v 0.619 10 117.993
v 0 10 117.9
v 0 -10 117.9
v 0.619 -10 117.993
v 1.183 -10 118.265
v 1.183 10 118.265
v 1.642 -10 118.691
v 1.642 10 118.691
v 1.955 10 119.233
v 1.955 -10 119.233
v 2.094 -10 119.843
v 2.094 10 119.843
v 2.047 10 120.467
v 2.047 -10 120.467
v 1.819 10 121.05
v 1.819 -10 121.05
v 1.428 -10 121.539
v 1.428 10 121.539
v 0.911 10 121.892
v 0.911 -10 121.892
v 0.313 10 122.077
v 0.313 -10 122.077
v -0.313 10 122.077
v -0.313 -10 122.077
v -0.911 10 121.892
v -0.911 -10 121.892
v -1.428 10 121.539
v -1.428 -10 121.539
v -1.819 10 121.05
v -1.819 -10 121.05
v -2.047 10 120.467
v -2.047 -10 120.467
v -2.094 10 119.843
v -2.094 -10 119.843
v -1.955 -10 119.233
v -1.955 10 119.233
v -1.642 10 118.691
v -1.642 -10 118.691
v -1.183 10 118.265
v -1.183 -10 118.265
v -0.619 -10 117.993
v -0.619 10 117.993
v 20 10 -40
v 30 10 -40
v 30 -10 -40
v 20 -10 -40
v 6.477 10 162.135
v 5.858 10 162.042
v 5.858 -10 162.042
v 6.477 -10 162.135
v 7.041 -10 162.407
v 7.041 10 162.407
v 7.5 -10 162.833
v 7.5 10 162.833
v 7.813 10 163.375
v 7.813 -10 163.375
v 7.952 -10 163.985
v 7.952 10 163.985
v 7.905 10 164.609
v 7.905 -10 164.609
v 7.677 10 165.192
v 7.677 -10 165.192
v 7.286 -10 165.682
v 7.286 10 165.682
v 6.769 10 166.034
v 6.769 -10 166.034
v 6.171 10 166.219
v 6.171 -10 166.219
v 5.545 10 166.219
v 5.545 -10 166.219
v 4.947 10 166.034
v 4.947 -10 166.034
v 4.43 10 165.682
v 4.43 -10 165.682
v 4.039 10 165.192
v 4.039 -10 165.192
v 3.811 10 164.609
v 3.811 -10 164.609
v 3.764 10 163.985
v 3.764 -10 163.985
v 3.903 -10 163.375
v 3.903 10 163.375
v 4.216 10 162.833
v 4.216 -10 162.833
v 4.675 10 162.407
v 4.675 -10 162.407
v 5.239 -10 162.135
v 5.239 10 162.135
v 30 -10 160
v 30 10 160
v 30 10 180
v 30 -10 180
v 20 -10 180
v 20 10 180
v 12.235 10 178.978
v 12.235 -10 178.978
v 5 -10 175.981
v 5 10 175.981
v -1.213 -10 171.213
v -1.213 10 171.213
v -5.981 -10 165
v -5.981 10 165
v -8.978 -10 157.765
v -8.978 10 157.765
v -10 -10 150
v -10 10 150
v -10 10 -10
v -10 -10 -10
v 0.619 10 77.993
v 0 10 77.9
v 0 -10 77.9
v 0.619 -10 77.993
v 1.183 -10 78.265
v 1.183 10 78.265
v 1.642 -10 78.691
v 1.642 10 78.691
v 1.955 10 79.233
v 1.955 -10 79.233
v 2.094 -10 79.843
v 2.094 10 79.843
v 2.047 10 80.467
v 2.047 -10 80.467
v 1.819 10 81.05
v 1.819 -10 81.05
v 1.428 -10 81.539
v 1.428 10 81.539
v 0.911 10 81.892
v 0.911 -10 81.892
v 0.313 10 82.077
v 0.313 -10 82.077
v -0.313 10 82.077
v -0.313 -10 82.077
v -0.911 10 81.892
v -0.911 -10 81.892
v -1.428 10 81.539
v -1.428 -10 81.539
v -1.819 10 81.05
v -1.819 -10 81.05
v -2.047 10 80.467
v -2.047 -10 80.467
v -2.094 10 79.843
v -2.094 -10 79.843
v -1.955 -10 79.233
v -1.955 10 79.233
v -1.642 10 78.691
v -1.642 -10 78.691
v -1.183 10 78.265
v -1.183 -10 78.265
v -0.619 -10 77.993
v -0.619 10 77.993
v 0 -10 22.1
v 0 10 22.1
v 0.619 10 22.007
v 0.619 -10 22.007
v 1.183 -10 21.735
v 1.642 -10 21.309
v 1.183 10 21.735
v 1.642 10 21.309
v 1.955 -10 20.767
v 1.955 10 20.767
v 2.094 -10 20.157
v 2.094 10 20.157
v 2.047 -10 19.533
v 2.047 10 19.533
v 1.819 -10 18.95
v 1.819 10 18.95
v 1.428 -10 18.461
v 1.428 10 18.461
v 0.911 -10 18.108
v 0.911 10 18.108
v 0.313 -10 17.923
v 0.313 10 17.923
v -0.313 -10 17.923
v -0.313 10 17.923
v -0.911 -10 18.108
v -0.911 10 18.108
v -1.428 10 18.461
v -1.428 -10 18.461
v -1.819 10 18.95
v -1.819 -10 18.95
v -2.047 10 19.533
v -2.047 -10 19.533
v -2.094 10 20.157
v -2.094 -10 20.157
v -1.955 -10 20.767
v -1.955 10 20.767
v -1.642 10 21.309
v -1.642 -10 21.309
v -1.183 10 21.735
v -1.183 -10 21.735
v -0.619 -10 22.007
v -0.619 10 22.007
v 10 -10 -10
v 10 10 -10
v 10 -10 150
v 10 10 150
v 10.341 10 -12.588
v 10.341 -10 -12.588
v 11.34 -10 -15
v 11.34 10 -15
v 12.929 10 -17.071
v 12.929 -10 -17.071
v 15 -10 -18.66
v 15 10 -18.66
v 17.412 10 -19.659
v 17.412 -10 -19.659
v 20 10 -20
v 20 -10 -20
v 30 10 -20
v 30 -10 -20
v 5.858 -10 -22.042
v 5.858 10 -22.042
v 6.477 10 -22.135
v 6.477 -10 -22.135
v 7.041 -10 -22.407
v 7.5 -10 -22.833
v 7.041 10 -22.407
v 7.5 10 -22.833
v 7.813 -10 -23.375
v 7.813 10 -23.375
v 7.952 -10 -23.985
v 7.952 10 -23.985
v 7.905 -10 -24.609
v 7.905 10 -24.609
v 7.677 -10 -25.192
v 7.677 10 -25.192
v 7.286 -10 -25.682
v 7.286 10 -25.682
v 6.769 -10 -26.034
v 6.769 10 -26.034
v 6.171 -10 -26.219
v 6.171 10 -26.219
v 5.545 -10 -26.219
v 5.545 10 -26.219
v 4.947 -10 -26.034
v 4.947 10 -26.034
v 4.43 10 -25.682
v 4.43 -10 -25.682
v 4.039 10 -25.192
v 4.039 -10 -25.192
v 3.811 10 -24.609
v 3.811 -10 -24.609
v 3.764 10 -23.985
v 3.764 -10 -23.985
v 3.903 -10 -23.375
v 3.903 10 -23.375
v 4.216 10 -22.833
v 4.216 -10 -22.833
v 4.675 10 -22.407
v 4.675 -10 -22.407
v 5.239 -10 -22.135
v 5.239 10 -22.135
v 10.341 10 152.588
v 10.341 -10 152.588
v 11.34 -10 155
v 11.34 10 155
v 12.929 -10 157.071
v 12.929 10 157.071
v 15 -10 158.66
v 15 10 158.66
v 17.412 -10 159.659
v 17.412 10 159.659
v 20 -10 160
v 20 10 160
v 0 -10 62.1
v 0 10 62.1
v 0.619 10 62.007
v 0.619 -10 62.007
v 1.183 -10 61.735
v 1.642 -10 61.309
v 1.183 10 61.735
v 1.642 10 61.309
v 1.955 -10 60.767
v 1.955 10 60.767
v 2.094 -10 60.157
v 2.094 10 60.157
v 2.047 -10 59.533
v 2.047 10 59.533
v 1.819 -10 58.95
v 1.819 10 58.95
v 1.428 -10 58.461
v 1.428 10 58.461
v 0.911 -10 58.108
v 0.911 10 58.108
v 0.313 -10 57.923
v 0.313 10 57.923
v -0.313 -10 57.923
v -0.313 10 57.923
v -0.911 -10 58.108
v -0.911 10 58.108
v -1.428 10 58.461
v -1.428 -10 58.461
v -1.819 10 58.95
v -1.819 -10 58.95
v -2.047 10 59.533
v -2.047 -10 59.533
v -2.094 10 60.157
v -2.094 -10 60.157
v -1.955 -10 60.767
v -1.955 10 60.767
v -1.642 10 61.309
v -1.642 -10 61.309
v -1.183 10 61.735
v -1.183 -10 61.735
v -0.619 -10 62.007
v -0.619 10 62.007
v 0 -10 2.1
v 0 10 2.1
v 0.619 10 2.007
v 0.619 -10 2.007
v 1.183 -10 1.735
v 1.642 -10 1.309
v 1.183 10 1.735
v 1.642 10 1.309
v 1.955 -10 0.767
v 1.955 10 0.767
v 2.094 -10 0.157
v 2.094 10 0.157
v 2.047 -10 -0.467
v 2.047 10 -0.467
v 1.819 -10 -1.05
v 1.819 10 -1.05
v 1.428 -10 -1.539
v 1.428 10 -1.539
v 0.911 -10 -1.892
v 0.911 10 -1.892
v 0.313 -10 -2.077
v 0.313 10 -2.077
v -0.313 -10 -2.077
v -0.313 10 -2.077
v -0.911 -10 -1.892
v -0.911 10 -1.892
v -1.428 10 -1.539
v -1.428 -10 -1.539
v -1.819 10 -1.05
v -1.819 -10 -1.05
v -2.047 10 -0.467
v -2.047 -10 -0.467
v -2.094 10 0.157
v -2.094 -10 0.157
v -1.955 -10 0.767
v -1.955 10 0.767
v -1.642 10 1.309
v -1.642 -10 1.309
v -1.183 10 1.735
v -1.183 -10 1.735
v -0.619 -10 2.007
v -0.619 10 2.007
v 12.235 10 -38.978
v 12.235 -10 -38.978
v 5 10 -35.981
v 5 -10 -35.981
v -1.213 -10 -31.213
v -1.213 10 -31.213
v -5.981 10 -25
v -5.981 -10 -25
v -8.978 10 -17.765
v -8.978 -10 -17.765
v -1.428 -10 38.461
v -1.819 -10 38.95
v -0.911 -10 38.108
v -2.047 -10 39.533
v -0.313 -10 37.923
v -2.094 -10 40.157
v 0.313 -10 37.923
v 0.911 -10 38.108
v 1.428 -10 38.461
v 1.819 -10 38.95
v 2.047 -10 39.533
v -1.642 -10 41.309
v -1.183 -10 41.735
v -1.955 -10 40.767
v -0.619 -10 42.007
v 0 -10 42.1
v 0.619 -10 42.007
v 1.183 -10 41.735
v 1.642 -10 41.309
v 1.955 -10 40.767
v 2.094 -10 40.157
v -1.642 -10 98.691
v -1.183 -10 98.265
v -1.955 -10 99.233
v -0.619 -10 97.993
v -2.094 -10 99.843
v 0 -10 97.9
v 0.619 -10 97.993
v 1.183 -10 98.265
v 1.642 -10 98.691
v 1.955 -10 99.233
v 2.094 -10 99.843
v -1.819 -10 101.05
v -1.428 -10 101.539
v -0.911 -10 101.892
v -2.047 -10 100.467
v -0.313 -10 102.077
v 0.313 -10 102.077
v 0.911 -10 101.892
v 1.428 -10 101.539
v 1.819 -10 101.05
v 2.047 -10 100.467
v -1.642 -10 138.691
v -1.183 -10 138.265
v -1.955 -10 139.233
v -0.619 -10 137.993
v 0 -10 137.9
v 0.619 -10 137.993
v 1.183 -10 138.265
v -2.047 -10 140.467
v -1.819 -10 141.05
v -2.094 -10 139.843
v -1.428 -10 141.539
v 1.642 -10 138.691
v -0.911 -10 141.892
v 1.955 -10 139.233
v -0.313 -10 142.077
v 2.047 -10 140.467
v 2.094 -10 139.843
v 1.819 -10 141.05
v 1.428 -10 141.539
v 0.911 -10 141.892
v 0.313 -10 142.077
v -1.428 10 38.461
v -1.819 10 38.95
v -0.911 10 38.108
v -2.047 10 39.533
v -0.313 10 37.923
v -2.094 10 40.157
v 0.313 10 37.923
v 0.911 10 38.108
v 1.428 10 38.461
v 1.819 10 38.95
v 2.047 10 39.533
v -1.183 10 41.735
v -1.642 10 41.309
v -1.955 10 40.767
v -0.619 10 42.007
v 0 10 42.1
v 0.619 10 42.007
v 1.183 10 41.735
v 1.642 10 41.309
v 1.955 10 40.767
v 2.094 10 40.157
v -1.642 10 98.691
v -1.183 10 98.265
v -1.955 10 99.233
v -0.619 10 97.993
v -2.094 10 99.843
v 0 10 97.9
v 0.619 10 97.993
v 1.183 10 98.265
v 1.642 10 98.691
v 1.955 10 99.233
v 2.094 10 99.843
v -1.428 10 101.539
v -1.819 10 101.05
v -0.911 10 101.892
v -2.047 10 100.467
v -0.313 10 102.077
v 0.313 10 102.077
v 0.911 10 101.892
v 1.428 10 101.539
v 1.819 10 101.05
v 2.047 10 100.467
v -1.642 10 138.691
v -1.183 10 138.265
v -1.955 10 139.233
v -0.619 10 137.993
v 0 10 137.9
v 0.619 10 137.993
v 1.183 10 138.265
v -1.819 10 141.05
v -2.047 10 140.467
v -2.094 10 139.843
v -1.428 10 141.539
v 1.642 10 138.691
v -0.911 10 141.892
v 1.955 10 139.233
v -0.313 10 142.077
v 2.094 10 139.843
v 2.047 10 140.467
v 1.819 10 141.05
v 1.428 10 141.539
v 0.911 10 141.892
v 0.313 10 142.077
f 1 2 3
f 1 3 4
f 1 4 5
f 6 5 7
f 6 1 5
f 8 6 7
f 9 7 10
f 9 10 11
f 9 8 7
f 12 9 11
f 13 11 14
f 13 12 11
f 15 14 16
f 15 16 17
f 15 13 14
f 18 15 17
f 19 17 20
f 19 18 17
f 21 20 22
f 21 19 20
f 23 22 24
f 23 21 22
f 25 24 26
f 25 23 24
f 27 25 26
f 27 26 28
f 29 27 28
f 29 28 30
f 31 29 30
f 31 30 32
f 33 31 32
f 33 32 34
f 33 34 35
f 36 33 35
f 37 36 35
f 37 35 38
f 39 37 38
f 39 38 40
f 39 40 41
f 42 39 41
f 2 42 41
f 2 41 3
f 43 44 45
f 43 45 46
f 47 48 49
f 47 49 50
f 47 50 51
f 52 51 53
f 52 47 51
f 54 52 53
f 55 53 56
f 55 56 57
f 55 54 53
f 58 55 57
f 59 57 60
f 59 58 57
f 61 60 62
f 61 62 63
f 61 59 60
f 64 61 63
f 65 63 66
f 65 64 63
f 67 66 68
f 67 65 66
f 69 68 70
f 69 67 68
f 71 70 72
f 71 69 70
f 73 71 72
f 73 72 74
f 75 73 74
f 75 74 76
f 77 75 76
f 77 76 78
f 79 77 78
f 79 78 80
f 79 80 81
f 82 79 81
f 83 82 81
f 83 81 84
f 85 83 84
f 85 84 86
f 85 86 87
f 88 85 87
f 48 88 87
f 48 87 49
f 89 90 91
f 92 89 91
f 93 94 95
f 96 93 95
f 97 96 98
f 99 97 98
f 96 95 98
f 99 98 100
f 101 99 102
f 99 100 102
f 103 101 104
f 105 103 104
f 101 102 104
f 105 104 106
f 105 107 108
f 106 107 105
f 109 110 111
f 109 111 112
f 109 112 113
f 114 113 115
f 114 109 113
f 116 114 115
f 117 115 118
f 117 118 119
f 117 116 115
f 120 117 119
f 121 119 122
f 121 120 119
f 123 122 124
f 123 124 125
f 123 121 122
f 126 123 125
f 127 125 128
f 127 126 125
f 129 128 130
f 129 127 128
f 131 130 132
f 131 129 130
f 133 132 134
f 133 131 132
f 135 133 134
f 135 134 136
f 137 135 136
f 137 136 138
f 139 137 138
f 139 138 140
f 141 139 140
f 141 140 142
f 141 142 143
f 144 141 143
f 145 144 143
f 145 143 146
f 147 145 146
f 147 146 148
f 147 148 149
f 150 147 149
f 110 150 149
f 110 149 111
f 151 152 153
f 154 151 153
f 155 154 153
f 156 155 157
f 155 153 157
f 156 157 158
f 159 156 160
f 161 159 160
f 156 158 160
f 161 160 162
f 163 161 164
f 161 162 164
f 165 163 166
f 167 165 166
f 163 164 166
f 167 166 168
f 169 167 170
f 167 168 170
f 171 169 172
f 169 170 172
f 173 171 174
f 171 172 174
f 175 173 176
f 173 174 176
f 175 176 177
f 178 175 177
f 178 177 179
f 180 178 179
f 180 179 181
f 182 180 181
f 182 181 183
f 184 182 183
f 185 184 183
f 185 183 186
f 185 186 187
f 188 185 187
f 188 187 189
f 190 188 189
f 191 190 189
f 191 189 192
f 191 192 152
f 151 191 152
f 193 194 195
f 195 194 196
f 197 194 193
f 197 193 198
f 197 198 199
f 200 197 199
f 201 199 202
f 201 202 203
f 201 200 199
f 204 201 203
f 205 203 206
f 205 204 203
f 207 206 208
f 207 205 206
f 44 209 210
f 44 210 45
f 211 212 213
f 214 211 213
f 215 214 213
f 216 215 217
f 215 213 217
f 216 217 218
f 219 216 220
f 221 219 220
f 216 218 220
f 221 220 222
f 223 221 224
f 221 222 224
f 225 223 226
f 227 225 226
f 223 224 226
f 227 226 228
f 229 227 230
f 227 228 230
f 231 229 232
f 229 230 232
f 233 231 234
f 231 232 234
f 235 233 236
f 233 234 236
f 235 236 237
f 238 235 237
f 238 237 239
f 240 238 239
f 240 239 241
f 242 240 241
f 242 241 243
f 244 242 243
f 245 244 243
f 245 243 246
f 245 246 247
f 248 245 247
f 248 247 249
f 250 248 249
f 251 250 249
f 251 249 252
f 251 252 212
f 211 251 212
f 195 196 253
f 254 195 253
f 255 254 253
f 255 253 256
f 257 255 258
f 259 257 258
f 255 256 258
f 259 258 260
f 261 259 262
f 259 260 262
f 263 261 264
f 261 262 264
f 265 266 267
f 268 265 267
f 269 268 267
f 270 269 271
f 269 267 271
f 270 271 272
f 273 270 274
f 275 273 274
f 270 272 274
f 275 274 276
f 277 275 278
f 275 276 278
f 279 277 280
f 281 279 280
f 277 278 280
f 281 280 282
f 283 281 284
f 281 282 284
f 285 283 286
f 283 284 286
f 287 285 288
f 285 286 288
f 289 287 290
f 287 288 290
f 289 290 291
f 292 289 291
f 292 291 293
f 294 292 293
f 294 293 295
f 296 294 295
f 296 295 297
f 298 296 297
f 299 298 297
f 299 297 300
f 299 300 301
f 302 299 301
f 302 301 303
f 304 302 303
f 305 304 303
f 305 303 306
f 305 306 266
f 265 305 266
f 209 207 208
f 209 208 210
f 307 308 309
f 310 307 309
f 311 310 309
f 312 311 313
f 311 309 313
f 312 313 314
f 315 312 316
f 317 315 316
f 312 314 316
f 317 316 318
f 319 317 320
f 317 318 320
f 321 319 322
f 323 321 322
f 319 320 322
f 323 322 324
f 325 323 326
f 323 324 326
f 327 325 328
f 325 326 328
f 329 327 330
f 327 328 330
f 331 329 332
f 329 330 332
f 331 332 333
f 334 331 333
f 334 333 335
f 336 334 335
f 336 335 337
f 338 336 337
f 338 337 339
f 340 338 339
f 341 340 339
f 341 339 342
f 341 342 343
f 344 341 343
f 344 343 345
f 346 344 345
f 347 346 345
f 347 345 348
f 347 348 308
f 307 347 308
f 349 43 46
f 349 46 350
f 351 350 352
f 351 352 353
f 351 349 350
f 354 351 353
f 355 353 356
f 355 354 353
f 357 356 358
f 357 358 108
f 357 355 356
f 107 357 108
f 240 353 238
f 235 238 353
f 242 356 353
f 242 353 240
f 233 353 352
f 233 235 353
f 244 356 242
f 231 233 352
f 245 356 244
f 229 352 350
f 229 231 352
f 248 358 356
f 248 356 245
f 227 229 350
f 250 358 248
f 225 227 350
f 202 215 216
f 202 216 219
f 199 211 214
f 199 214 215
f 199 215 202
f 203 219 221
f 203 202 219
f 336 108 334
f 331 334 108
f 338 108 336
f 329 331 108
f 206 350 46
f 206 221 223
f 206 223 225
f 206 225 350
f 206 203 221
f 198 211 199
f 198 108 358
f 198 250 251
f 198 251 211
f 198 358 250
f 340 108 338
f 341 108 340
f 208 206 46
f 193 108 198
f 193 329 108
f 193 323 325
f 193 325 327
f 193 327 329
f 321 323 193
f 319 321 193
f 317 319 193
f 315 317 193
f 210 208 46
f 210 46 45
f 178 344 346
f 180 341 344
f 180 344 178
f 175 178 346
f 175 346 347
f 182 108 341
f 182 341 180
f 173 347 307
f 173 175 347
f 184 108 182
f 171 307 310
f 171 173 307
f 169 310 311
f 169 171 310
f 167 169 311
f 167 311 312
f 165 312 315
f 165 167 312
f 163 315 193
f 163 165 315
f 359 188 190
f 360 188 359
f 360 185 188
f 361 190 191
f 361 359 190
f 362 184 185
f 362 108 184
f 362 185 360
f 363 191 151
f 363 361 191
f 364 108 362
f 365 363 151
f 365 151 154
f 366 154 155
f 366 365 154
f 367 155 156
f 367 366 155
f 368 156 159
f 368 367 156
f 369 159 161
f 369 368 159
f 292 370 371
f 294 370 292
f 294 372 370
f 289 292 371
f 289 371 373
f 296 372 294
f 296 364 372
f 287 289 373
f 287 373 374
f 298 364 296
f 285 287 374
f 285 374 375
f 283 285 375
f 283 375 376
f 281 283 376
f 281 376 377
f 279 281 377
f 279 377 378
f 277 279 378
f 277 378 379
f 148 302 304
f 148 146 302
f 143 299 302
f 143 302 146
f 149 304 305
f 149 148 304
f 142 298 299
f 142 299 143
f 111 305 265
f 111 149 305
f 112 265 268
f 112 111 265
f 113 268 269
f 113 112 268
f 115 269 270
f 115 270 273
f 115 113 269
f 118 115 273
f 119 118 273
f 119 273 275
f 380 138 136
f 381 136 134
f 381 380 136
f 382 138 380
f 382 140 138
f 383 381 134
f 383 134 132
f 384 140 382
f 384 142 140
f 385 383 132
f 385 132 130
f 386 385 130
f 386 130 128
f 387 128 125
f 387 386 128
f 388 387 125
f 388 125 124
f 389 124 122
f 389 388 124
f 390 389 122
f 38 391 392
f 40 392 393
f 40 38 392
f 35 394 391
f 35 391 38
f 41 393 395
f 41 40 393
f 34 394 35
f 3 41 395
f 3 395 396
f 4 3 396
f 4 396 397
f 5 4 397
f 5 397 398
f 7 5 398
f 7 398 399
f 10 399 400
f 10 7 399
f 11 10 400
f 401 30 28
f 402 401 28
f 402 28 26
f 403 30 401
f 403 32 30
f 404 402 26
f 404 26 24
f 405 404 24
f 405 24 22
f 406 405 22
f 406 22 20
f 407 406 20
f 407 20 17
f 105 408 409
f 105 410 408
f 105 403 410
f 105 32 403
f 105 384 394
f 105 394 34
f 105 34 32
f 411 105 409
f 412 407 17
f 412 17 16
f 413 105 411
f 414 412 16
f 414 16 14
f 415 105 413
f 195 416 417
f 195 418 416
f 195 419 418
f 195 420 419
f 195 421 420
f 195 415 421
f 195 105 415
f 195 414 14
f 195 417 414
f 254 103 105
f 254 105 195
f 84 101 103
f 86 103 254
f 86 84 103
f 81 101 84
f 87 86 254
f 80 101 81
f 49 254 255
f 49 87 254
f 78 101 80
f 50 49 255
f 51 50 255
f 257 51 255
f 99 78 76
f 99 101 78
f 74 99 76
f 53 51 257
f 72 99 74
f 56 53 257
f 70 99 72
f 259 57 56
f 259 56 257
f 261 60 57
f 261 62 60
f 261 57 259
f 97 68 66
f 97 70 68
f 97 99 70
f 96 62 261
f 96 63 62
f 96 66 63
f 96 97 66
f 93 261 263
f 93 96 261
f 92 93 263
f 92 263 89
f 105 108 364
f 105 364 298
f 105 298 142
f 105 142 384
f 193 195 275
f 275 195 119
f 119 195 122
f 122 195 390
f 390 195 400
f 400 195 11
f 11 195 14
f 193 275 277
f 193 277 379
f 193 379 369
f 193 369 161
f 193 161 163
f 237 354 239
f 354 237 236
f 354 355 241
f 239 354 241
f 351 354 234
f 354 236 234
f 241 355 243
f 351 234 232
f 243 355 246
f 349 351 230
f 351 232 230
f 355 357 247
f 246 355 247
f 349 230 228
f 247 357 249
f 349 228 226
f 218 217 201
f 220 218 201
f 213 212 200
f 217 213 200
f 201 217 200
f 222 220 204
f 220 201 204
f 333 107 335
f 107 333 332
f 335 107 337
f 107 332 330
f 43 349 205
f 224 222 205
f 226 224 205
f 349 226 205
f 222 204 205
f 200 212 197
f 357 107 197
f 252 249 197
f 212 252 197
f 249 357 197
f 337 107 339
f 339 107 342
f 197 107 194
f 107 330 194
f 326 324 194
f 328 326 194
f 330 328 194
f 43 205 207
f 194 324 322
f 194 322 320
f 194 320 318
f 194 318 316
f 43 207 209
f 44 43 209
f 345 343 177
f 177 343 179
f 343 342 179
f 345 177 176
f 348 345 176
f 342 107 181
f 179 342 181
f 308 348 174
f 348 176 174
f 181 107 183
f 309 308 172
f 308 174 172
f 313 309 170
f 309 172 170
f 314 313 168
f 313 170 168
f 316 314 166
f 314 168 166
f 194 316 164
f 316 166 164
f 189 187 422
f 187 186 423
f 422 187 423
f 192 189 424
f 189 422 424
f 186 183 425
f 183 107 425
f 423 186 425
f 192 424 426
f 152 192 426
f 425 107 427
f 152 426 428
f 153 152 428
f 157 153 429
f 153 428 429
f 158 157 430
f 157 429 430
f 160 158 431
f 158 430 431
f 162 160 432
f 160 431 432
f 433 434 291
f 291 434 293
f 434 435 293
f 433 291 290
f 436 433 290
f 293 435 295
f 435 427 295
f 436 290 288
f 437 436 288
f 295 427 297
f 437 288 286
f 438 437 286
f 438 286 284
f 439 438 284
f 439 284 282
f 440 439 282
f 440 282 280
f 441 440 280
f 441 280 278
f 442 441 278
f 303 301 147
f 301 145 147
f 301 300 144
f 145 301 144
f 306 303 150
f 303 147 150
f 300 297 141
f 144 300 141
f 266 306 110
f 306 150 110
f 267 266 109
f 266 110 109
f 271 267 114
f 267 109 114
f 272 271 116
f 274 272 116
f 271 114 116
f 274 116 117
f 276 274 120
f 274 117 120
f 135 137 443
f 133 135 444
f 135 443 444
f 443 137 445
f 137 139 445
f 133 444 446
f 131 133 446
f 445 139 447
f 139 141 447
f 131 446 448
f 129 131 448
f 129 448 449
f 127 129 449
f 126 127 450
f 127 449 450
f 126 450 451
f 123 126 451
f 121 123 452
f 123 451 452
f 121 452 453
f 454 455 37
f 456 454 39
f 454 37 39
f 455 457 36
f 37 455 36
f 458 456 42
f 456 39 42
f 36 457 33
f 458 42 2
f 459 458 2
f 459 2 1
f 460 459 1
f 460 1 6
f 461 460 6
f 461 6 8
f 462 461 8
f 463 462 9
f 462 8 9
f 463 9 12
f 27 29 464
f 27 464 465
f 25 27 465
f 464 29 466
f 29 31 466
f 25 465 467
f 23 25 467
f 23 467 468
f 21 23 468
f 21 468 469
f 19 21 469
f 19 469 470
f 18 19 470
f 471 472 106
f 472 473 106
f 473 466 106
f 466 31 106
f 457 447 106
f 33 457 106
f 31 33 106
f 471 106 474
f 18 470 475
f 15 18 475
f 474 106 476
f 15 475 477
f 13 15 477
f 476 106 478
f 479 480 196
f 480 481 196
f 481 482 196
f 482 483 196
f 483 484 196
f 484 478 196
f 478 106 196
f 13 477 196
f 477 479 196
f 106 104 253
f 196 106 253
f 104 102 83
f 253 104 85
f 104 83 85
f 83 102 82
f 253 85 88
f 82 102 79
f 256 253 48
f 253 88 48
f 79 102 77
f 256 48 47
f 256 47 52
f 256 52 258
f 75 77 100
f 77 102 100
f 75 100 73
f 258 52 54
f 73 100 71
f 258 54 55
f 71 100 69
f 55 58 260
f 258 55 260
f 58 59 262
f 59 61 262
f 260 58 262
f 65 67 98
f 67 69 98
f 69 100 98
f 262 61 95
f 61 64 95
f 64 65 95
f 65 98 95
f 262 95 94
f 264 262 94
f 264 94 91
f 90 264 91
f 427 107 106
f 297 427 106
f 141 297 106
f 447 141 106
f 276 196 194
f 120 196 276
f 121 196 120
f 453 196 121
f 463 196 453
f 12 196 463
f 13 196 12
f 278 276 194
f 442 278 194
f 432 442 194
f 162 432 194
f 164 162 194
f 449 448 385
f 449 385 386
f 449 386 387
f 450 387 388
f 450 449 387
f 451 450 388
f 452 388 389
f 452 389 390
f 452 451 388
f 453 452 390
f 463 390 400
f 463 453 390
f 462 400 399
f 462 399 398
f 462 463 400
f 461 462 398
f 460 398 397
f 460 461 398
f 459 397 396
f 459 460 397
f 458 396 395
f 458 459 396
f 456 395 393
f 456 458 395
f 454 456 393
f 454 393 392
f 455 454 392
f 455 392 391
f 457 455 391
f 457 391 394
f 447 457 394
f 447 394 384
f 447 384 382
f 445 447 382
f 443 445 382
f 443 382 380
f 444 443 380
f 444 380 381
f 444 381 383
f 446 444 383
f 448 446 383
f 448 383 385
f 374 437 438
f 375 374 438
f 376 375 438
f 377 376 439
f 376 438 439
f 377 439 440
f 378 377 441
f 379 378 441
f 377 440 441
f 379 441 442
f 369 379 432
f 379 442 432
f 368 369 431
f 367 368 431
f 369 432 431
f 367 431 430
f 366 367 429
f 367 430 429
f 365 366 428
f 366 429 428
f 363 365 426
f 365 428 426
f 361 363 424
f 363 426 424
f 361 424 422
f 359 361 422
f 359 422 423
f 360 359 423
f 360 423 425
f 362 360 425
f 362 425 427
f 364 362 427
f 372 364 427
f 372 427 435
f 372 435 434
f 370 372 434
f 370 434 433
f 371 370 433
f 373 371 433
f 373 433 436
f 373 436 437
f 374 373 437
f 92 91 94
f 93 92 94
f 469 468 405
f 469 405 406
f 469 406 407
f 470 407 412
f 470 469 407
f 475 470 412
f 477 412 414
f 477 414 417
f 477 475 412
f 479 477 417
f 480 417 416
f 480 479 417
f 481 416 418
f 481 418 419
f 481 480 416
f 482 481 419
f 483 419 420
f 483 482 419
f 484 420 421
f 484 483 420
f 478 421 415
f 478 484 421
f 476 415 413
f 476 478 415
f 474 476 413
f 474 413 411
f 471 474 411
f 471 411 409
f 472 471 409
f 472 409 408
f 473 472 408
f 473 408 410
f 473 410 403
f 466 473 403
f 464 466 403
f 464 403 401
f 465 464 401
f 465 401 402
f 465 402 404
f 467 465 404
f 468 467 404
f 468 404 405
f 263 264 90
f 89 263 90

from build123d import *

# Parameters (mm, degrees)
BOSS_EXTRUDE1_DEPTH = 10
SKETCH3_W           = 20
SKETCH3_H           = 70
BOSS_EXTRUDE2_DEPTH = 20
SKETCH2_R           = 2.1
CUT_EXTRUDE1_DEPTH  = 79.74007874


with BuildPart() as part:
    # Sketch1 → Boss-Extrude1 (new, symmetric)
    with BuildSketch(Plane(origin=(0, 0, 0), x_dir=(1, 0, 0), z_dir=(0, 1, 0))):
        with BuildLine():
            Line((10, 0), (10, 10))
            ThreePointArc((10, 10), (12.928932188, 17.071067812), (20, 20))
            Line((20, 20), (30, 20))
            Line((30, 20), (30, 40))
            Line((30, 40), (20, 40))
            ThreePointArc((20, 40), (-1.213203436, 31.213203436), (-10, 10))
            Line((-10, 10), (-10, 0))
            Line((-10, 0), (10, 0))
        make_face()
    extrude(amount=BOSS_EXTRUDE1_DEPTH, both=True)

    # Sketch3 → Boss-Extrude2 (add)
    with BuildSketch(Plane(origin=(0, 10, 0), x_dir=(1, 0, 0), z_dir=(0, 1, 0))):
        with Locations((0, -35)):
            Rectangle(SKETCH3_W, SKETCH3_H)
    extrude(amount=-BOSS_EXTRUDE2_DEPTH)

    # Sketch2 → Cut-Extrude1 (cut, through all)
    with BuildSketch(Plane(origin=(0, 10, 0), x_dir=(1, 0, 0), z_dir=(0, 1, 0))):
        with Locations(Location((5.857864376, 24.142135624, 0), (0, 0, 270))):
            Circle(SKETCH2_R)
        with Locations(Location((0, -40, 0), (0, 0, 270))):
            Circle(SKETCH2_R)
        with Locations((70, 30)):
            Circle(SKETCH2_R)
        with Locations(Location((0, -60, 0), (0, 0, 270))):
            Circle(SKETCH2_R)
        with Locations(Location((0, -20, 0), (0, 0, 270))):
            Circle(SKETCH2_R)
        with Locations(Location((0, 0, 0), (0, 0, 270))):
            Circle(SKETCH2_R)
    extrude(amount=-CUT_EXTRUDE1_DEPTH, mode=Mode.SUBTRACT)

    # Mirror1: part across plane


with BuildPart() as part_1:
    add(part.part)
    add(part.part.mirror(Plane(origin=(10, -82.801098893, 70), x_dir=(1, 0, 0), z_dir=(0, 0, 1))))


solid = part_1.part
